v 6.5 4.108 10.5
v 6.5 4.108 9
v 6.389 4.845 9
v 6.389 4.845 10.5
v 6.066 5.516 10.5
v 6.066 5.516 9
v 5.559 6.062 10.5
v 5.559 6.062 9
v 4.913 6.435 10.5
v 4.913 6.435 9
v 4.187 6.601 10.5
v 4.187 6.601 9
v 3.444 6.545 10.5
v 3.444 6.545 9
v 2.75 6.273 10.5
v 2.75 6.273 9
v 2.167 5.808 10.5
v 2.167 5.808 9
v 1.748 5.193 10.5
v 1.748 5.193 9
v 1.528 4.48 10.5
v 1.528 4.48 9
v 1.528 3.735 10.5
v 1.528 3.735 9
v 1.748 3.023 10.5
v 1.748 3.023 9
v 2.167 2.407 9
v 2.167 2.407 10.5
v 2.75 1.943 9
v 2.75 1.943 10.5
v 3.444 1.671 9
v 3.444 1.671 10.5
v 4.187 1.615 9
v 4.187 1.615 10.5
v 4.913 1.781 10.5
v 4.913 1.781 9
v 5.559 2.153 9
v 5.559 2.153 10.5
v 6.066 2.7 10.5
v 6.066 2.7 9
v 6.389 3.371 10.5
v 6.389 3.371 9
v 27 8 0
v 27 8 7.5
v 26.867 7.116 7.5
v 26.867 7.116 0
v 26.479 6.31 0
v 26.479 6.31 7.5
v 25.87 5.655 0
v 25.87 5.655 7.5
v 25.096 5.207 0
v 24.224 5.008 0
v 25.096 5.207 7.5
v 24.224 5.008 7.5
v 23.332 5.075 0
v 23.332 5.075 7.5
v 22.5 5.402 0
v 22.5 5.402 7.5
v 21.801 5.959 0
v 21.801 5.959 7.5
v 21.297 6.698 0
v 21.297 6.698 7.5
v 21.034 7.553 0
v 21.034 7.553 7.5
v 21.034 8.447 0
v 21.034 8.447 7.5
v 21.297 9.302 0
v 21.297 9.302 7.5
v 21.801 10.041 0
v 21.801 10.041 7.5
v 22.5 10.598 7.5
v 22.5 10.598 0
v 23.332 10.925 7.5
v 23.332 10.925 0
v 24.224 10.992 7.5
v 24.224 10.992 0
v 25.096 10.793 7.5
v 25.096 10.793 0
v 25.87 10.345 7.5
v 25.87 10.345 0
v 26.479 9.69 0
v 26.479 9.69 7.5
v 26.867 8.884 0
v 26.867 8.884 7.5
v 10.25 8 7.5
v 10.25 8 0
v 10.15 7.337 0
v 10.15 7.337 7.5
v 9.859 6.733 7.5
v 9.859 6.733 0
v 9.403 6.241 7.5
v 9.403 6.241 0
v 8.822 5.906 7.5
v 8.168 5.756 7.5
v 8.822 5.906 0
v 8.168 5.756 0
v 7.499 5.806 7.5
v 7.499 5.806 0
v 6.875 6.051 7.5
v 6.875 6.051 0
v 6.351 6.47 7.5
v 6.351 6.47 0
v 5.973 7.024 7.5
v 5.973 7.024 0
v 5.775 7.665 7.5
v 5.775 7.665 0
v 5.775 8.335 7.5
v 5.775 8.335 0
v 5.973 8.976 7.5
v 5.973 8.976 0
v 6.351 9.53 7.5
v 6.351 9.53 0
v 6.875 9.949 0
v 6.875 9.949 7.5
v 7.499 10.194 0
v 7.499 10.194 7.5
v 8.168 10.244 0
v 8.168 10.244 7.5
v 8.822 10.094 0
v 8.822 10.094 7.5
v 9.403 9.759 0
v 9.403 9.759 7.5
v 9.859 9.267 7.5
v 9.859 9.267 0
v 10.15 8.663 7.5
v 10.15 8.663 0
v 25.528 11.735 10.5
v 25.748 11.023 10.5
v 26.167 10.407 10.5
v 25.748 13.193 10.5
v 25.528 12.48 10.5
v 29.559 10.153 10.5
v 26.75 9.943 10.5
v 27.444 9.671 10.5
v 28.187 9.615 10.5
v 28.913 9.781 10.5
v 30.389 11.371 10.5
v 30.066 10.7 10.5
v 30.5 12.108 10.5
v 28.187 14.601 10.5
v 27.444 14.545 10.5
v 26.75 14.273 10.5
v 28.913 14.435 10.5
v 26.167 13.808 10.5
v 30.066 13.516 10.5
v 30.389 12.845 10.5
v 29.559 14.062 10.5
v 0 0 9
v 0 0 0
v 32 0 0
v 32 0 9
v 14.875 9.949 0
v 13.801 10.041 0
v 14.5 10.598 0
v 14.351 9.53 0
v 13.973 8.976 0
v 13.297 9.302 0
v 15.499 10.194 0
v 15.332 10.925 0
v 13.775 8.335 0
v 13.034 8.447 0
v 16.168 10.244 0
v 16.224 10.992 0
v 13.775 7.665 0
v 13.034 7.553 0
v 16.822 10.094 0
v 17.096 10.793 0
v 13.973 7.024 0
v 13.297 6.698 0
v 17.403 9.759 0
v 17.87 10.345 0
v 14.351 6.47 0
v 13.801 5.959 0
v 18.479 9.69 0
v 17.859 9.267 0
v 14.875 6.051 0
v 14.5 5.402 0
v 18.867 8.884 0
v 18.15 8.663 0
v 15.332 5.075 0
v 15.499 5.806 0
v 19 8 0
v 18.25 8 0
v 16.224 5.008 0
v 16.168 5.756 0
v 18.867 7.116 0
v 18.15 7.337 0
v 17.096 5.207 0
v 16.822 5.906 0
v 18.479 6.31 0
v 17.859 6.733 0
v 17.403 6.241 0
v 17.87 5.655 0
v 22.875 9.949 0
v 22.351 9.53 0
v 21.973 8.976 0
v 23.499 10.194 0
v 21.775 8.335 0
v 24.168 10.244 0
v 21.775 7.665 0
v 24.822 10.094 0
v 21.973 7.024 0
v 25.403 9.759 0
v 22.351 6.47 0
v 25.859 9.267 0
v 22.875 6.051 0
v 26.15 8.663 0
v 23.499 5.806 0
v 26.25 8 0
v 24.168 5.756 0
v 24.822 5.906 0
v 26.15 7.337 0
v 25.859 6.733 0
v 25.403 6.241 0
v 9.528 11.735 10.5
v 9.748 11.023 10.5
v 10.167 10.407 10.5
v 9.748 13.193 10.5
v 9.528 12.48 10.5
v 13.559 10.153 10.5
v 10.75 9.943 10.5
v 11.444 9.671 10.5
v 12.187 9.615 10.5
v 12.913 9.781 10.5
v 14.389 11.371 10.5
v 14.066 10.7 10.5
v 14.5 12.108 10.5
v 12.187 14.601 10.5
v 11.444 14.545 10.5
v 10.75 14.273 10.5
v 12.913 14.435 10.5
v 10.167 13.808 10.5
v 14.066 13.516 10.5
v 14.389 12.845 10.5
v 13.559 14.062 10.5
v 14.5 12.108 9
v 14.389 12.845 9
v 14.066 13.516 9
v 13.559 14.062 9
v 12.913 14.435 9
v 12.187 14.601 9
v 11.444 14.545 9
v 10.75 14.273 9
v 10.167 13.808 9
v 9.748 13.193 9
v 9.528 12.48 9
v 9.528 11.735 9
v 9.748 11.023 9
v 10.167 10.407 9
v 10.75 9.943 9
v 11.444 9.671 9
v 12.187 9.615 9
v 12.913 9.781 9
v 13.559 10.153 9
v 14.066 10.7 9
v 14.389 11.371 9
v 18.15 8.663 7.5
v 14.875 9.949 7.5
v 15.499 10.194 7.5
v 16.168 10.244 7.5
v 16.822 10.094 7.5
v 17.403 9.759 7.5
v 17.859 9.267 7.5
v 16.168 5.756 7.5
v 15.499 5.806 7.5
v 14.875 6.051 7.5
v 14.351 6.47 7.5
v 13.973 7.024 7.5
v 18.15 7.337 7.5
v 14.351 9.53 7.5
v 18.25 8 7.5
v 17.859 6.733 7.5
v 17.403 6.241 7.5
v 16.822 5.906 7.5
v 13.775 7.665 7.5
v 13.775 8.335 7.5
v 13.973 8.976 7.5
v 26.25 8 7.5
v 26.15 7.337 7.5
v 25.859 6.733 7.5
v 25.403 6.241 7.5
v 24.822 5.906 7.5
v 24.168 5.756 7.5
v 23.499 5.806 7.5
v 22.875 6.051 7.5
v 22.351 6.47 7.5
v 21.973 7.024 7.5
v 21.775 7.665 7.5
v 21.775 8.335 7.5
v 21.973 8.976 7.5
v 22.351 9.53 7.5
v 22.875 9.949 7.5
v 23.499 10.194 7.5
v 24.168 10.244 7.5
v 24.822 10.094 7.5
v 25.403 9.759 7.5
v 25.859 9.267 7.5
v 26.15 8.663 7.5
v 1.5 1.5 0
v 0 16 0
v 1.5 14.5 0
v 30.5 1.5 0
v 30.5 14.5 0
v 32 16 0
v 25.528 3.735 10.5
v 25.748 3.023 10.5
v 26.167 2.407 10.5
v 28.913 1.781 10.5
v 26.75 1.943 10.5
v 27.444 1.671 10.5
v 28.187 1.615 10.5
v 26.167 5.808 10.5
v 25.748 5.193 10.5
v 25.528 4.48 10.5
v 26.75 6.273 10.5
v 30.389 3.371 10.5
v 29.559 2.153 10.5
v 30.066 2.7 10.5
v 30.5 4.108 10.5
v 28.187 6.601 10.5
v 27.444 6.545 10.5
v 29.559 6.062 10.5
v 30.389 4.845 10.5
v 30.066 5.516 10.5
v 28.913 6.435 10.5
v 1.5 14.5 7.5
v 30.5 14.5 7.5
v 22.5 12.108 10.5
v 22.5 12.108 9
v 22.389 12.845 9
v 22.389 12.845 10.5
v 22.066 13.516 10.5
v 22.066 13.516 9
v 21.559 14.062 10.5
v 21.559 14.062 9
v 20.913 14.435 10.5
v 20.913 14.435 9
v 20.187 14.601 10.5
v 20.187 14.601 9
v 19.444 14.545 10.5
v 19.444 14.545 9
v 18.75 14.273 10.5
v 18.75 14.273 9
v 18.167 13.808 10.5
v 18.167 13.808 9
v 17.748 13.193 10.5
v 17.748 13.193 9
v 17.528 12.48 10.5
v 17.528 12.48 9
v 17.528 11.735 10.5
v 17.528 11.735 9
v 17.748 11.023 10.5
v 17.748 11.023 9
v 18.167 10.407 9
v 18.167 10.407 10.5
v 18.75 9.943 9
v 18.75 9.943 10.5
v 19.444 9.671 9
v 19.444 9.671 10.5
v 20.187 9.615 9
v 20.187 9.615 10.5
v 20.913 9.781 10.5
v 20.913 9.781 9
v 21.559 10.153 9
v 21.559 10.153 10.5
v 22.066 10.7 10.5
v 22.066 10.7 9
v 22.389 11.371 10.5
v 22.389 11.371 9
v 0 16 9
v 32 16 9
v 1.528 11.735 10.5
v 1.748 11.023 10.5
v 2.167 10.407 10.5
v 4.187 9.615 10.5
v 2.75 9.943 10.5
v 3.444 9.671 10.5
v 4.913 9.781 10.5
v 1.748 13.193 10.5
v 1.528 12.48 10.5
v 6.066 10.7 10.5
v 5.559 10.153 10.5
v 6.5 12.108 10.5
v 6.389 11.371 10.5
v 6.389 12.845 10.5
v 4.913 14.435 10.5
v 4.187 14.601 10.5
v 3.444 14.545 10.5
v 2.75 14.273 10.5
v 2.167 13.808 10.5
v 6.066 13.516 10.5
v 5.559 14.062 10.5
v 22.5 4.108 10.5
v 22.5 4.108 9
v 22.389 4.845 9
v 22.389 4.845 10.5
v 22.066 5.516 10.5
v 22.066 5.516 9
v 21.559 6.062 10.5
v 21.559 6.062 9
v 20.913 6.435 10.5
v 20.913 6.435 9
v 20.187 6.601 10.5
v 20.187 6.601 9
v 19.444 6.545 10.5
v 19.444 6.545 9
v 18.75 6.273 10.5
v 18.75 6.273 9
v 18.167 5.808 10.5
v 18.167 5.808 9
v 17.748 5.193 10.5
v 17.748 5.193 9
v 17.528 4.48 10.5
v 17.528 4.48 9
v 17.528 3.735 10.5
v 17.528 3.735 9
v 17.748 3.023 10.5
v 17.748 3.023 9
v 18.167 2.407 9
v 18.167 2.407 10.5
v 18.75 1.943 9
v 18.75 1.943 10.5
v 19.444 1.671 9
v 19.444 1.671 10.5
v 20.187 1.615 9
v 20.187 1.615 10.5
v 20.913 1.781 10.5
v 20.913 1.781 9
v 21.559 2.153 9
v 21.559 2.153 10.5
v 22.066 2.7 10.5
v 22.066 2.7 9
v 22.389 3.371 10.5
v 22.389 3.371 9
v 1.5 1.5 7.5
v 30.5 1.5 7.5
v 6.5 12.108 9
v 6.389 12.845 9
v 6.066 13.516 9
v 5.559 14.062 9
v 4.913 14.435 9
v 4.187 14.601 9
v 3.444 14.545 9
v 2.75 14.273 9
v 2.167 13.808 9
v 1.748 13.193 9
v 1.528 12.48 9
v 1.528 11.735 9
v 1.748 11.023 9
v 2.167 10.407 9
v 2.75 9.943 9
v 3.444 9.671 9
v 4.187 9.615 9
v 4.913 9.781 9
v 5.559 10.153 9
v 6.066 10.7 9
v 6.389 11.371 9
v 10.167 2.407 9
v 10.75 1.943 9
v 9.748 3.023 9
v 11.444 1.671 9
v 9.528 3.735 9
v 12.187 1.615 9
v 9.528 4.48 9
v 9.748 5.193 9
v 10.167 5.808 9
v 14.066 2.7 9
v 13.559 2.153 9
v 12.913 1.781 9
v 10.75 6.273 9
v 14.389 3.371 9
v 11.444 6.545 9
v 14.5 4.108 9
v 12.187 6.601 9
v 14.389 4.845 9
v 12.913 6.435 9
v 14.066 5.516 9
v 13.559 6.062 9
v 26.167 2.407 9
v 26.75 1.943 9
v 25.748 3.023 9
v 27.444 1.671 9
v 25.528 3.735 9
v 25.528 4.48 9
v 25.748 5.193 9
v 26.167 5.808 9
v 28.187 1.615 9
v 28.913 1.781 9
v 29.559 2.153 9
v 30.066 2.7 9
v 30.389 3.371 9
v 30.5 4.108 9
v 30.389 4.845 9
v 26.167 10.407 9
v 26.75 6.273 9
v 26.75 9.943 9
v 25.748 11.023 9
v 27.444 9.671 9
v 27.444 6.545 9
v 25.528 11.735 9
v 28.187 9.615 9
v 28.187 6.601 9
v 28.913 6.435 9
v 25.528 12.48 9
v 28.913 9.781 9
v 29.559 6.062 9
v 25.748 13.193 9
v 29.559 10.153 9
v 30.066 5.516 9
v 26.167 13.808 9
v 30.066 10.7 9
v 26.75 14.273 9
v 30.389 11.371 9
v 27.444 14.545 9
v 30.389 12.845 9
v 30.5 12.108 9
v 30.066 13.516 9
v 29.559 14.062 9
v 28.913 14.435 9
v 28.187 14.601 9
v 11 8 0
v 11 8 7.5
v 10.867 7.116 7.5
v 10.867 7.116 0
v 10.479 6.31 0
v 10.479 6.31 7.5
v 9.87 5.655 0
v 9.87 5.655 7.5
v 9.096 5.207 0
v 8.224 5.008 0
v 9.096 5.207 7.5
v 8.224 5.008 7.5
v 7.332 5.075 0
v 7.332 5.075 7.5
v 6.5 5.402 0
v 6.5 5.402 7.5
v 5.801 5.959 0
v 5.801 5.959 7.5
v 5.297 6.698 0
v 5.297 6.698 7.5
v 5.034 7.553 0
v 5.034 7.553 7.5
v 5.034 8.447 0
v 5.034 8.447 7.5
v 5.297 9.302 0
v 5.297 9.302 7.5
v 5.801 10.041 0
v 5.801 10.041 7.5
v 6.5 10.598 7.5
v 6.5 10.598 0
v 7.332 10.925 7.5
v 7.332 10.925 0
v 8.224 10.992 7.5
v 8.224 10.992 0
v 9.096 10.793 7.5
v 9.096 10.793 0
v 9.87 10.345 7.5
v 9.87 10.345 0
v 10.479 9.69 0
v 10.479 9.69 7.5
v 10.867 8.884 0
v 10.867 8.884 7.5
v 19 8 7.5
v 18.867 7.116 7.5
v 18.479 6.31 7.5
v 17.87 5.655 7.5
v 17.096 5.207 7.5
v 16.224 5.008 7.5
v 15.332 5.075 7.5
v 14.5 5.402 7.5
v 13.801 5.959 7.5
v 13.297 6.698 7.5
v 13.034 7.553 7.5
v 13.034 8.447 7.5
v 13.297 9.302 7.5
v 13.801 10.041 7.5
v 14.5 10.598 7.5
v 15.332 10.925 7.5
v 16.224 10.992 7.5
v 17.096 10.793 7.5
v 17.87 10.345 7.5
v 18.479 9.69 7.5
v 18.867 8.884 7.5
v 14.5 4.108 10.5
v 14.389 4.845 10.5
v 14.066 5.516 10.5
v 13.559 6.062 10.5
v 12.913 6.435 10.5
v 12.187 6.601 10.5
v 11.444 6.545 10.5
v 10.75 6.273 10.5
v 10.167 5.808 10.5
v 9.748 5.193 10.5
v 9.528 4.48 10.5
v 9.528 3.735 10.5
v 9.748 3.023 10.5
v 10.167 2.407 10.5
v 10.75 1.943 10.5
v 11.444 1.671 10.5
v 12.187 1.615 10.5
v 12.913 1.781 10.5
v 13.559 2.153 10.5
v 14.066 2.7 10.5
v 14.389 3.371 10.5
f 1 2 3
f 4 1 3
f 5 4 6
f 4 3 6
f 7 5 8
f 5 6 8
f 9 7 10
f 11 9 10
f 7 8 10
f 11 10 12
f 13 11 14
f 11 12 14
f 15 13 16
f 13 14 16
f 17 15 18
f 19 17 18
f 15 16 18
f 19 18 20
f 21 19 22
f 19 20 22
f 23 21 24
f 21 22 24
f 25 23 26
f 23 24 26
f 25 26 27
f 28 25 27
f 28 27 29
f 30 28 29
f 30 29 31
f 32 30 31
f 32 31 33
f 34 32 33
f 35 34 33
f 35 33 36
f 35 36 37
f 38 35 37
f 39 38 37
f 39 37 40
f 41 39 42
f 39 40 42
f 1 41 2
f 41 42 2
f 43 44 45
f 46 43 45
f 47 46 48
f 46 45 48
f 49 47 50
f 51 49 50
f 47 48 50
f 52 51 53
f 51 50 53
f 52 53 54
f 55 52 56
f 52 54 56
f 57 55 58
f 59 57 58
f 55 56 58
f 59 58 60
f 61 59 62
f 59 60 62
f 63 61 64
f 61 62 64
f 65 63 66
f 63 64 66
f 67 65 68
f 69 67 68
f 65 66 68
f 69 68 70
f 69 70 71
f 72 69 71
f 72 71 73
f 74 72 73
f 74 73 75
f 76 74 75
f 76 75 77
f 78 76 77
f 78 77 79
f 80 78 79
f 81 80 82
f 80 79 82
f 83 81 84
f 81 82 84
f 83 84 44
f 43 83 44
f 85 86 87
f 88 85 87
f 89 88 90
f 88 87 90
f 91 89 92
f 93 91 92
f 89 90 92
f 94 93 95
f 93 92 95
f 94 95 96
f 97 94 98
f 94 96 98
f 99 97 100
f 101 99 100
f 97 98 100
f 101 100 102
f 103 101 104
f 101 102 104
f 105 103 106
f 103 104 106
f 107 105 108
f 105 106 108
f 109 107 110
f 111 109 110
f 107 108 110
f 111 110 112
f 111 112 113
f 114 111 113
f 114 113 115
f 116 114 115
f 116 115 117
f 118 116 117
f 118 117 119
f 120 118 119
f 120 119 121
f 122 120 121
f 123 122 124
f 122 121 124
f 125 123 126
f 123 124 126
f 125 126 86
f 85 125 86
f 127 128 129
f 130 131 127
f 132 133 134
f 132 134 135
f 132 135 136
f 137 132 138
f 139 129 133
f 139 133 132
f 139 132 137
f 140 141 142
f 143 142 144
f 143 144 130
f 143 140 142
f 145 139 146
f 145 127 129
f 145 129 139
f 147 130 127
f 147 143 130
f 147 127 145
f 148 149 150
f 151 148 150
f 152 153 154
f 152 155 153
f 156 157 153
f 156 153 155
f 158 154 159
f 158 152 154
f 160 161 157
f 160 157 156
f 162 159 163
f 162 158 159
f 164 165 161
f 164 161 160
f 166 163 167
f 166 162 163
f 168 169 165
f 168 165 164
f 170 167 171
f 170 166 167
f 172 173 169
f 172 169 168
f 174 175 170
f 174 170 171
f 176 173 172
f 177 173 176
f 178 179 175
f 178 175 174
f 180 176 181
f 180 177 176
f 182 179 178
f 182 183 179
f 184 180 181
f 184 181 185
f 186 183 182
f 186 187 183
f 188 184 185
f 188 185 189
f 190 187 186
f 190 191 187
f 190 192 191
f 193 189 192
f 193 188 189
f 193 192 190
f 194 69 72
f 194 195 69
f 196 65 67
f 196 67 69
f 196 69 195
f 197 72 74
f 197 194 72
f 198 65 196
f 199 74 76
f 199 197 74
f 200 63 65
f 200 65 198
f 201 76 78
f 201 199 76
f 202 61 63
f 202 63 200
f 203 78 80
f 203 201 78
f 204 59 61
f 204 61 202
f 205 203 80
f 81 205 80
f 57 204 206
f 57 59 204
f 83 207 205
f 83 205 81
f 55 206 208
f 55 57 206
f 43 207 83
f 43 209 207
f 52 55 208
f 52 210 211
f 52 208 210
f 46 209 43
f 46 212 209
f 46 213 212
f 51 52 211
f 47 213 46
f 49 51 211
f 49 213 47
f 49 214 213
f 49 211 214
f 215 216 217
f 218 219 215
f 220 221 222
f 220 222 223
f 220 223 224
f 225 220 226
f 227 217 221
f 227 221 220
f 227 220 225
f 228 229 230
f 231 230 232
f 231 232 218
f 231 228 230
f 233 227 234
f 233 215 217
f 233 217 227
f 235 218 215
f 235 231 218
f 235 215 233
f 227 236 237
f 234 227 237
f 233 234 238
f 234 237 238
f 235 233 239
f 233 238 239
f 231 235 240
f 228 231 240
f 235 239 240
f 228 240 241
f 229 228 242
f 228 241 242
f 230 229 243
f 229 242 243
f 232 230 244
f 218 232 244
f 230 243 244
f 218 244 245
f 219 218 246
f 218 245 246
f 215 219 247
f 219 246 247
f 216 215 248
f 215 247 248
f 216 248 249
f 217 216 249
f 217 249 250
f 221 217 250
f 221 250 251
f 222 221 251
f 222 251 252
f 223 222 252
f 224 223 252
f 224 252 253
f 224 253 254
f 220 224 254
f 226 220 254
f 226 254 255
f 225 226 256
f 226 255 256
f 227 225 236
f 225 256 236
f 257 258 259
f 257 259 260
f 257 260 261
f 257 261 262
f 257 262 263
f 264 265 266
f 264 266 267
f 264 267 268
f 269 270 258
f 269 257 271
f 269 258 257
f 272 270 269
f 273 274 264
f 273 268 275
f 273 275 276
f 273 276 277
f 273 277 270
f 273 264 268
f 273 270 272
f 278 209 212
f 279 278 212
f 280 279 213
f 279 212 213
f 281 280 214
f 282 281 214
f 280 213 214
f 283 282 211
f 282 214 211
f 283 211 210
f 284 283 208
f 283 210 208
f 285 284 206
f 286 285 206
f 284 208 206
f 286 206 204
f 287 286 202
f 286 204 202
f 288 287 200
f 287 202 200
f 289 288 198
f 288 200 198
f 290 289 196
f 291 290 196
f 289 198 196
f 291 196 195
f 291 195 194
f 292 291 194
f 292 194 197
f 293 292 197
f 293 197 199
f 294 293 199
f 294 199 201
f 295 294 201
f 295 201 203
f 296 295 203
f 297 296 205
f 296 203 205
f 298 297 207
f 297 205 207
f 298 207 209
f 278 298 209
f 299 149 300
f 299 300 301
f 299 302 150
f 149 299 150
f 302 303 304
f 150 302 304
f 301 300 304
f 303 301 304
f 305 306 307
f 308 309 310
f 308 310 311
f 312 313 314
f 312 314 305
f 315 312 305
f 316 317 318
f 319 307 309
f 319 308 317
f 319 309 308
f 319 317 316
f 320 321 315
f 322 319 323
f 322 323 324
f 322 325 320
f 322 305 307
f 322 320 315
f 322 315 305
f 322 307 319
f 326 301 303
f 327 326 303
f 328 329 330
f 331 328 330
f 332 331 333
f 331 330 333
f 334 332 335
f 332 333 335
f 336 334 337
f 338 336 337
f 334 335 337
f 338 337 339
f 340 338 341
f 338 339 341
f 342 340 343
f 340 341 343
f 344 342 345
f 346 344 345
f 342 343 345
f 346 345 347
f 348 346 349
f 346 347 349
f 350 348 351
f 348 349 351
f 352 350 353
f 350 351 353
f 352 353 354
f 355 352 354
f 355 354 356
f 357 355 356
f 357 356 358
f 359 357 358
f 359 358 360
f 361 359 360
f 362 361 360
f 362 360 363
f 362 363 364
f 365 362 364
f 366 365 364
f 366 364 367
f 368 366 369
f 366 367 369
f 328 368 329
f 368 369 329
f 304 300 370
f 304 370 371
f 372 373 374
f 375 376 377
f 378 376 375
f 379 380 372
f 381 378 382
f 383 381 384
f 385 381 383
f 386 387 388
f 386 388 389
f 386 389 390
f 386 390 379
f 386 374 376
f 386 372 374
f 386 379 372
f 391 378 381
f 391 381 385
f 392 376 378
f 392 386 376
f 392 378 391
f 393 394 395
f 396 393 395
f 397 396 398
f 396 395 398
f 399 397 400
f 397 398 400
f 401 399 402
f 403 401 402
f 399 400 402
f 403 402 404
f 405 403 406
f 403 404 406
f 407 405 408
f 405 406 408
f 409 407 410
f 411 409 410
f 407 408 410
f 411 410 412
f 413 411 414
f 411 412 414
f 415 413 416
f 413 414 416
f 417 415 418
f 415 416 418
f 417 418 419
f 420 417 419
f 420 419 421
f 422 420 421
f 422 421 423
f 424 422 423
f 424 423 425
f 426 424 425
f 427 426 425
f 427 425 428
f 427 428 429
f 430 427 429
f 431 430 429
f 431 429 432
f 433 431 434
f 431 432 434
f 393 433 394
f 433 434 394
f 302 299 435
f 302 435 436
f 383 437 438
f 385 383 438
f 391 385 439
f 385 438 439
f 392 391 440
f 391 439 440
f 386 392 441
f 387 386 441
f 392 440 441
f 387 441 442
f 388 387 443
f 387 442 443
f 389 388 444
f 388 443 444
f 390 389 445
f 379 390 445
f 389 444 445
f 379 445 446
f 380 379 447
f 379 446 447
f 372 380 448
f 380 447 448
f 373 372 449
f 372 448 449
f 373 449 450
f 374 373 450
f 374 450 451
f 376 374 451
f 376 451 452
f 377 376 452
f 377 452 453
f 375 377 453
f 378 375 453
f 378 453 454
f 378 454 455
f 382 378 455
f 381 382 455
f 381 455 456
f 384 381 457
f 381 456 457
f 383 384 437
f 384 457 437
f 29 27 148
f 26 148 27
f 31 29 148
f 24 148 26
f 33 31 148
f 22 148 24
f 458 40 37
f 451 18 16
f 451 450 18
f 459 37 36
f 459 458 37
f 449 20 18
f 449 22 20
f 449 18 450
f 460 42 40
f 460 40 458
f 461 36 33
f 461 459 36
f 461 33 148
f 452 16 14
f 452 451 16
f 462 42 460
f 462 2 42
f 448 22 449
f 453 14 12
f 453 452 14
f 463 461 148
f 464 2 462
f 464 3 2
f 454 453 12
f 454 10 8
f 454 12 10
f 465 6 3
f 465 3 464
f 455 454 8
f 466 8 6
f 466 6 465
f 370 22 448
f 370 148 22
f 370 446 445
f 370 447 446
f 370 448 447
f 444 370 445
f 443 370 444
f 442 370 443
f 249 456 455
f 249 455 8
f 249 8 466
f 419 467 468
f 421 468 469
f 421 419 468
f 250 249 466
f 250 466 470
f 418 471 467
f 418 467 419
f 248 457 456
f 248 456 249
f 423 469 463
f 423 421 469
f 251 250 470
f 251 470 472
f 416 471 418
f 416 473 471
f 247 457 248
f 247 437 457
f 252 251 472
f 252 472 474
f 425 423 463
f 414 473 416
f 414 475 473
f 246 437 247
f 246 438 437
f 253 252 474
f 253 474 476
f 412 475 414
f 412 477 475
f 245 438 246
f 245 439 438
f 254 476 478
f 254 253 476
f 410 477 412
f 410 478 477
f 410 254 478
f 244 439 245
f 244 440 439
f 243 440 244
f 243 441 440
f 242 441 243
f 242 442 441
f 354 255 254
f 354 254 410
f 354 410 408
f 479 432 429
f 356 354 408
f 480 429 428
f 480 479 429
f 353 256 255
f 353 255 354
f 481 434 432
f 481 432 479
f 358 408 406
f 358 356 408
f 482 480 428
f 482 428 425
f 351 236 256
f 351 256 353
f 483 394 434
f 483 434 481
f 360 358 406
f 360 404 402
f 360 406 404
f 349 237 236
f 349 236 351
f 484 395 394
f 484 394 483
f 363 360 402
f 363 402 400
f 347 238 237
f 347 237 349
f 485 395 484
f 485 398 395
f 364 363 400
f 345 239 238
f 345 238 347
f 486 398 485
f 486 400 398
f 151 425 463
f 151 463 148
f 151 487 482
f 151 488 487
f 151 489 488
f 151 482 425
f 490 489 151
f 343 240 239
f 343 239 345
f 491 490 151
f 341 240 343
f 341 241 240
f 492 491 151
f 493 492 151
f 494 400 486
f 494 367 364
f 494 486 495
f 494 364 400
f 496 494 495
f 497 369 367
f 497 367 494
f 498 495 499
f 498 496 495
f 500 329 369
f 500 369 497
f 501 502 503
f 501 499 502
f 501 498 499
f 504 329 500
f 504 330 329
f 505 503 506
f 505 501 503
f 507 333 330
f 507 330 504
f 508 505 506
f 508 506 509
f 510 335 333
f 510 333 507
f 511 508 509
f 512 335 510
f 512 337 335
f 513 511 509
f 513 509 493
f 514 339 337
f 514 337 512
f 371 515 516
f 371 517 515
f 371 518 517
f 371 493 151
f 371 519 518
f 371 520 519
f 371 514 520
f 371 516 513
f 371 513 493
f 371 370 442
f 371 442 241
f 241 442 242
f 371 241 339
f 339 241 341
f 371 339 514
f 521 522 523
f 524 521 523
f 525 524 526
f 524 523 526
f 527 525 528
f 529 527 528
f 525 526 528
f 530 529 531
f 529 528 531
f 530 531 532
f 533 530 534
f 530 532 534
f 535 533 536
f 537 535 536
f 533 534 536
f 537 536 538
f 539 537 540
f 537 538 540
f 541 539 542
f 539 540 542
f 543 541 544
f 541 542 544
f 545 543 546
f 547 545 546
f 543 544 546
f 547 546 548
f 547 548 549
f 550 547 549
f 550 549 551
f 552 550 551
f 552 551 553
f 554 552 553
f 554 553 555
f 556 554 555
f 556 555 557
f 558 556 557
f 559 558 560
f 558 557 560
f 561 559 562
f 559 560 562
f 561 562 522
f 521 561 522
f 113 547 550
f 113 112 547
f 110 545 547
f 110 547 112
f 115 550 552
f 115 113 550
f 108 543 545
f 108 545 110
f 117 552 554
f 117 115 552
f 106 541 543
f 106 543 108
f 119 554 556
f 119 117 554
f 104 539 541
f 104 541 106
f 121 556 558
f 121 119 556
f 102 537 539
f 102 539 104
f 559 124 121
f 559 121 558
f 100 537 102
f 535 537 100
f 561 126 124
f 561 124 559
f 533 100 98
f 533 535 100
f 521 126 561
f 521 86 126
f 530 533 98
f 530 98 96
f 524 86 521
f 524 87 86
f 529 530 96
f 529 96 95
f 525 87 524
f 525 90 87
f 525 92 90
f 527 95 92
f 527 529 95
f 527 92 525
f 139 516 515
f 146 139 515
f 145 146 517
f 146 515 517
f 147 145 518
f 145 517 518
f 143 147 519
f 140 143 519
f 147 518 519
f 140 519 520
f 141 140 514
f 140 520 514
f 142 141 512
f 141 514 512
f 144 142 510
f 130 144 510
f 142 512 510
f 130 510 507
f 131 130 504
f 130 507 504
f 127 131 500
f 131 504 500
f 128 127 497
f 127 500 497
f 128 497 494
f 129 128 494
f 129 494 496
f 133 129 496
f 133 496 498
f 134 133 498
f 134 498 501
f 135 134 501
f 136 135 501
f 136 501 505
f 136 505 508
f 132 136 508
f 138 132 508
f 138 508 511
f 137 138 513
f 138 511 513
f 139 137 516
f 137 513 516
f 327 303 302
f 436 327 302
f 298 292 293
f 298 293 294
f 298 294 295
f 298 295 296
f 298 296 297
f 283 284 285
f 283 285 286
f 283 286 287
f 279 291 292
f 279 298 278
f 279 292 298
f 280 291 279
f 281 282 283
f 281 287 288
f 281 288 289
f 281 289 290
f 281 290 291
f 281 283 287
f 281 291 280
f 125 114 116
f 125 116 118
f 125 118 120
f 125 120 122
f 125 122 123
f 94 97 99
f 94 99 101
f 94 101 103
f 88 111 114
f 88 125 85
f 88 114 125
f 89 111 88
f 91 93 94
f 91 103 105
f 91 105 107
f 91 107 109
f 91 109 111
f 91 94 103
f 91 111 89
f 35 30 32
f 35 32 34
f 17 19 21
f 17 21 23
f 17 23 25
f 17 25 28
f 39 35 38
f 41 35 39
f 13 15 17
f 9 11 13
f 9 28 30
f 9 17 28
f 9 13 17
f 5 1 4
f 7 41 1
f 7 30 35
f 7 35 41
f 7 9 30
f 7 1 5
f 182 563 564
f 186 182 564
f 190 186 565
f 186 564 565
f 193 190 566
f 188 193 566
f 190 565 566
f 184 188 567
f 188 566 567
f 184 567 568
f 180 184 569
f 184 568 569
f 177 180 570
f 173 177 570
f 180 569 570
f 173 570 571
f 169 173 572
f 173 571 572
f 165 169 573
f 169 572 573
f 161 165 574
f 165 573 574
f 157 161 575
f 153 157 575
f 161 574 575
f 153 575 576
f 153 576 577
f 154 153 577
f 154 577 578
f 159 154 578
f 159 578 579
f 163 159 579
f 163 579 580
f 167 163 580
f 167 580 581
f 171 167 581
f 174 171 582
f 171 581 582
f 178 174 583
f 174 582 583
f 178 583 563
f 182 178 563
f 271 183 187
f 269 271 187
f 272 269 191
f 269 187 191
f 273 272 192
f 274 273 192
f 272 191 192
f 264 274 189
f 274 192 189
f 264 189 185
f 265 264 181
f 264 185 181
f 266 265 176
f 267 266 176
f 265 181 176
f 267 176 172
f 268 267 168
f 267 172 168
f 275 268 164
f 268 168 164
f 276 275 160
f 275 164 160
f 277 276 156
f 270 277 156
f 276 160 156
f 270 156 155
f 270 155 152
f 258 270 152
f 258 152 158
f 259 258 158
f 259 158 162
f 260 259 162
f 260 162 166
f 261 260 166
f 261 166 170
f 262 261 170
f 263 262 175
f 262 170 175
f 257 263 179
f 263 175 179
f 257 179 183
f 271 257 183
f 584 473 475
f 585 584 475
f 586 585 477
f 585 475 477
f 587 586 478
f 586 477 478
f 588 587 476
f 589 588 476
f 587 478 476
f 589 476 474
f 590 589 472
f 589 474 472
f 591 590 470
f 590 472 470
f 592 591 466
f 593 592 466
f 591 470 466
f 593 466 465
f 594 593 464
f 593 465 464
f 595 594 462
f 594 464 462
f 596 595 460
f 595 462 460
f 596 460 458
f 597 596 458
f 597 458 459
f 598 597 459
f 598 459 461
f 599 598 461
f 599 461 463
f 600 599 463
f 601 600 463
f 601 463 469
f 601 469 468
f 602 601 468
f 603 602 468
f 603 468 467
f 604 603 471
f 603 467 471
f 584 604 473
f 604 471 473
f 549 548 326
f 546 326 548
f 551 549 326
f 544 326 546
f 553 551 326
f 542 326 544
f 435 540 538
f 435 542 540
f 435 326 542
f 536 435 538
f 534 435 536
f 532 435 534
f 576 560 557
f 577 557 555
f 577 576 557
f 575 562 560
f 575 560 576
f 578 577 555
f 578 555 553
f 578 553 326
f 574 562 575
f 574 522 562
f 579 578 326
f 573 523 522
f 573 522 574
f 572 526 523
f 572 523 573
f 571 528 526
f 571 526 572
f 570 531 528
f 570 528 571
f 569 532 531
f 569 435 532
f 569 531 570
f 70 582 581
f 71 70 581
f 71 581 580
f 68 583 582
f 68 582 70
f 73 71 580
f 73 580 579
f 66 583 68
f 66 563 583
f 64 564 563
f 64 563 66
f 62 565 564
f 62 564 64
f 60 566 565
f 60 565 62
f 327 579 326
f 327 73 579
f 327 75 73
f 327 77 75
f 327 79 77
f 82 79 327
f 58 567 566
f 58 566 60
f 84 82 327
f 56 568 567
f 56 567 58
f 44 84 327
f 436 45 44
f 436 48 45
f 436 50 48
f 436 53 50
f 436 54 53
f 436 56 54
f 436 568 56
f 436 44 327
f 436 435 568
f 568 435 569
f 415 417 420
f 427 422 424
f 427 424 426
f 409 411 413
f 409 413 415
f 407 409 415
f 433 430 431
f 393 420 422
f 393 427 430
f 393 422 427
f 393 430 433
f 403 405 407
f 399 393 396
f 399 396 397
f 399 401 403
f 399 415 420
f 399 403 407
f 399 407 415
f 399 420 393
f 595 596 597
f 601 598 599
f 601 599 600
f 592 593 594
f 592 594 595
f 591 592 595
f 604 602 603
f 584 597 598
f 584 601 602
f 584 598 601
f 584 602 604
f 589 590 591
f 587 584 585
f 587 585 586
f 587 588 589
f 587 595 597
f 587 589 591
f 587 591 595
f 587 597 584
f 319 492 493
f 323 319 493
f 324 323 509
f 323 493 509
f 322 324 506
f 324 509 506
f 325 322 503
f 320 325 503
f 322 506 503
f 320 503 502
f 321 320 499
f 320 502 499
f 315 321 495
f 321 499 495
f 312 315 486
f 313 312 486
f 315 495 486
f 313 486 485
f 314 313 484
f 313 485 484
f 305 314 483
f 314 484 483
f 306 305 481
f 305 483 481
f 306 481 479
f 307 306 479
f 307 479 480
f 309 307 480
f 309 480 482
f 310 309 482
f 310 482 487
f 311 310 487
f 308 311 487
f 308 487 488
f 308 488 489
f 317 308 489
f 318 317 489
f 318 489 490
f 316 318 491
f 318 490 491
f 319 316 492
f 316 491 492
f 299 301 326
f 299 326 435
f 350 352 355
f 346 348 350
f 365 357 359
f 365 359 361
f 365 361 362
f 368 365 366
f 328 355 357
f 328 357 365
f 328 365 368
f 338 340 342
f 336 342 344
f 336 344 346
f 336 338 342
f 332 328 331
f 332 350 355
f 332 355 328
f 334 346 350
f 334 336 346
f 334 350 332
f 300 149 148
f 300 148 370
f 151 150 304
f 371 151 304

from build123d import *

# Parameters (mm, degrees)
F0_W     = 32
F0_H     = 16
F1_DEPTH = 9
F2_R     = 2.5
F3_DEPTH = 1.5
F4_W     = 29
F4_H     = 13
F5_DEPTH = 7.5
F6_R     = 3
F7_DEPTH = 7.5
F8_R     = 2.25
F9_DEPTH = 7.5


with BuildPart() as f1:
    # F0 (on Top) → F1 (new body)
    with BuildSketch(Plane.XY):
        with Locations((16, 8)):
            Rectangle(F0_W, F0_H)
    extrude(amount=F1_DEPTH)

    # F2 (on face) → F3 (join)
    with BuildSketch(Plane.XY.offset(9)):
        with Locations((4, 4.107877)):
            Circle(F2_R)
        with Locations((4, 12.107877)):
            Circle(F2_R)
        with Locations((12, 12.107877)):
            Circle(F2_R)
        with Locations((12, 4.107877)):
            Circle(F2_R)
        with Locations((20, 12.107877)):
            Circle(F2_R)
        with Locations((20, 4.107877)):
            Circle(F2_R)
        with Locations((28, 4.107877)):
            Circle(F2_R)
        with Locations((28, 12.107877)):
            Circle(F2_R)
    extrude(amount=F3_DEPTH)

    # F4 (on face) → F5 (cut)
    with BuildSketch(Plane(origin=(0, 0, 0), x_dir=(1, 0, 0), z_dir=(0, 0, -1))):
        with Locations((16, -8)):
            Rectangle(F4_W, F4_H)
    extrude(amount=-F5_DEPTH, mode=Mode.SUBTRACT)

    # F6 (on face) → F7 (join)
    with BuildSketch(Plane(origin=(0, 0, 7.5), x_dir=(1, 0, 0), z_dir=(0, 0, -1))):
        with Locations((8, -8)):
            Circle(F6_R)
        with Locations((16, -8)):
            Circle(F6_R)
        with Locations((24, -8)):
            Circle(F6_R)
    extrude(amount=F7_DEPTH)

    # F8 (on face) → F9 (cut)
    with BuildSketch(Plane(origin=(0, 0, 0), x_dir=(1, 0, 0), z_dir=(0, 0, -1))):
        with Locations((8, -8)):
            Circle(F8_R)
        with Locations((16, -8)):
            Circle(F8_R)
        with Locations((24, -8)):
            Circle(F8_R)
    extrude(amount=-F9_DEPTH, mode=Mode.SUBTRACT)


solid = f1.part
